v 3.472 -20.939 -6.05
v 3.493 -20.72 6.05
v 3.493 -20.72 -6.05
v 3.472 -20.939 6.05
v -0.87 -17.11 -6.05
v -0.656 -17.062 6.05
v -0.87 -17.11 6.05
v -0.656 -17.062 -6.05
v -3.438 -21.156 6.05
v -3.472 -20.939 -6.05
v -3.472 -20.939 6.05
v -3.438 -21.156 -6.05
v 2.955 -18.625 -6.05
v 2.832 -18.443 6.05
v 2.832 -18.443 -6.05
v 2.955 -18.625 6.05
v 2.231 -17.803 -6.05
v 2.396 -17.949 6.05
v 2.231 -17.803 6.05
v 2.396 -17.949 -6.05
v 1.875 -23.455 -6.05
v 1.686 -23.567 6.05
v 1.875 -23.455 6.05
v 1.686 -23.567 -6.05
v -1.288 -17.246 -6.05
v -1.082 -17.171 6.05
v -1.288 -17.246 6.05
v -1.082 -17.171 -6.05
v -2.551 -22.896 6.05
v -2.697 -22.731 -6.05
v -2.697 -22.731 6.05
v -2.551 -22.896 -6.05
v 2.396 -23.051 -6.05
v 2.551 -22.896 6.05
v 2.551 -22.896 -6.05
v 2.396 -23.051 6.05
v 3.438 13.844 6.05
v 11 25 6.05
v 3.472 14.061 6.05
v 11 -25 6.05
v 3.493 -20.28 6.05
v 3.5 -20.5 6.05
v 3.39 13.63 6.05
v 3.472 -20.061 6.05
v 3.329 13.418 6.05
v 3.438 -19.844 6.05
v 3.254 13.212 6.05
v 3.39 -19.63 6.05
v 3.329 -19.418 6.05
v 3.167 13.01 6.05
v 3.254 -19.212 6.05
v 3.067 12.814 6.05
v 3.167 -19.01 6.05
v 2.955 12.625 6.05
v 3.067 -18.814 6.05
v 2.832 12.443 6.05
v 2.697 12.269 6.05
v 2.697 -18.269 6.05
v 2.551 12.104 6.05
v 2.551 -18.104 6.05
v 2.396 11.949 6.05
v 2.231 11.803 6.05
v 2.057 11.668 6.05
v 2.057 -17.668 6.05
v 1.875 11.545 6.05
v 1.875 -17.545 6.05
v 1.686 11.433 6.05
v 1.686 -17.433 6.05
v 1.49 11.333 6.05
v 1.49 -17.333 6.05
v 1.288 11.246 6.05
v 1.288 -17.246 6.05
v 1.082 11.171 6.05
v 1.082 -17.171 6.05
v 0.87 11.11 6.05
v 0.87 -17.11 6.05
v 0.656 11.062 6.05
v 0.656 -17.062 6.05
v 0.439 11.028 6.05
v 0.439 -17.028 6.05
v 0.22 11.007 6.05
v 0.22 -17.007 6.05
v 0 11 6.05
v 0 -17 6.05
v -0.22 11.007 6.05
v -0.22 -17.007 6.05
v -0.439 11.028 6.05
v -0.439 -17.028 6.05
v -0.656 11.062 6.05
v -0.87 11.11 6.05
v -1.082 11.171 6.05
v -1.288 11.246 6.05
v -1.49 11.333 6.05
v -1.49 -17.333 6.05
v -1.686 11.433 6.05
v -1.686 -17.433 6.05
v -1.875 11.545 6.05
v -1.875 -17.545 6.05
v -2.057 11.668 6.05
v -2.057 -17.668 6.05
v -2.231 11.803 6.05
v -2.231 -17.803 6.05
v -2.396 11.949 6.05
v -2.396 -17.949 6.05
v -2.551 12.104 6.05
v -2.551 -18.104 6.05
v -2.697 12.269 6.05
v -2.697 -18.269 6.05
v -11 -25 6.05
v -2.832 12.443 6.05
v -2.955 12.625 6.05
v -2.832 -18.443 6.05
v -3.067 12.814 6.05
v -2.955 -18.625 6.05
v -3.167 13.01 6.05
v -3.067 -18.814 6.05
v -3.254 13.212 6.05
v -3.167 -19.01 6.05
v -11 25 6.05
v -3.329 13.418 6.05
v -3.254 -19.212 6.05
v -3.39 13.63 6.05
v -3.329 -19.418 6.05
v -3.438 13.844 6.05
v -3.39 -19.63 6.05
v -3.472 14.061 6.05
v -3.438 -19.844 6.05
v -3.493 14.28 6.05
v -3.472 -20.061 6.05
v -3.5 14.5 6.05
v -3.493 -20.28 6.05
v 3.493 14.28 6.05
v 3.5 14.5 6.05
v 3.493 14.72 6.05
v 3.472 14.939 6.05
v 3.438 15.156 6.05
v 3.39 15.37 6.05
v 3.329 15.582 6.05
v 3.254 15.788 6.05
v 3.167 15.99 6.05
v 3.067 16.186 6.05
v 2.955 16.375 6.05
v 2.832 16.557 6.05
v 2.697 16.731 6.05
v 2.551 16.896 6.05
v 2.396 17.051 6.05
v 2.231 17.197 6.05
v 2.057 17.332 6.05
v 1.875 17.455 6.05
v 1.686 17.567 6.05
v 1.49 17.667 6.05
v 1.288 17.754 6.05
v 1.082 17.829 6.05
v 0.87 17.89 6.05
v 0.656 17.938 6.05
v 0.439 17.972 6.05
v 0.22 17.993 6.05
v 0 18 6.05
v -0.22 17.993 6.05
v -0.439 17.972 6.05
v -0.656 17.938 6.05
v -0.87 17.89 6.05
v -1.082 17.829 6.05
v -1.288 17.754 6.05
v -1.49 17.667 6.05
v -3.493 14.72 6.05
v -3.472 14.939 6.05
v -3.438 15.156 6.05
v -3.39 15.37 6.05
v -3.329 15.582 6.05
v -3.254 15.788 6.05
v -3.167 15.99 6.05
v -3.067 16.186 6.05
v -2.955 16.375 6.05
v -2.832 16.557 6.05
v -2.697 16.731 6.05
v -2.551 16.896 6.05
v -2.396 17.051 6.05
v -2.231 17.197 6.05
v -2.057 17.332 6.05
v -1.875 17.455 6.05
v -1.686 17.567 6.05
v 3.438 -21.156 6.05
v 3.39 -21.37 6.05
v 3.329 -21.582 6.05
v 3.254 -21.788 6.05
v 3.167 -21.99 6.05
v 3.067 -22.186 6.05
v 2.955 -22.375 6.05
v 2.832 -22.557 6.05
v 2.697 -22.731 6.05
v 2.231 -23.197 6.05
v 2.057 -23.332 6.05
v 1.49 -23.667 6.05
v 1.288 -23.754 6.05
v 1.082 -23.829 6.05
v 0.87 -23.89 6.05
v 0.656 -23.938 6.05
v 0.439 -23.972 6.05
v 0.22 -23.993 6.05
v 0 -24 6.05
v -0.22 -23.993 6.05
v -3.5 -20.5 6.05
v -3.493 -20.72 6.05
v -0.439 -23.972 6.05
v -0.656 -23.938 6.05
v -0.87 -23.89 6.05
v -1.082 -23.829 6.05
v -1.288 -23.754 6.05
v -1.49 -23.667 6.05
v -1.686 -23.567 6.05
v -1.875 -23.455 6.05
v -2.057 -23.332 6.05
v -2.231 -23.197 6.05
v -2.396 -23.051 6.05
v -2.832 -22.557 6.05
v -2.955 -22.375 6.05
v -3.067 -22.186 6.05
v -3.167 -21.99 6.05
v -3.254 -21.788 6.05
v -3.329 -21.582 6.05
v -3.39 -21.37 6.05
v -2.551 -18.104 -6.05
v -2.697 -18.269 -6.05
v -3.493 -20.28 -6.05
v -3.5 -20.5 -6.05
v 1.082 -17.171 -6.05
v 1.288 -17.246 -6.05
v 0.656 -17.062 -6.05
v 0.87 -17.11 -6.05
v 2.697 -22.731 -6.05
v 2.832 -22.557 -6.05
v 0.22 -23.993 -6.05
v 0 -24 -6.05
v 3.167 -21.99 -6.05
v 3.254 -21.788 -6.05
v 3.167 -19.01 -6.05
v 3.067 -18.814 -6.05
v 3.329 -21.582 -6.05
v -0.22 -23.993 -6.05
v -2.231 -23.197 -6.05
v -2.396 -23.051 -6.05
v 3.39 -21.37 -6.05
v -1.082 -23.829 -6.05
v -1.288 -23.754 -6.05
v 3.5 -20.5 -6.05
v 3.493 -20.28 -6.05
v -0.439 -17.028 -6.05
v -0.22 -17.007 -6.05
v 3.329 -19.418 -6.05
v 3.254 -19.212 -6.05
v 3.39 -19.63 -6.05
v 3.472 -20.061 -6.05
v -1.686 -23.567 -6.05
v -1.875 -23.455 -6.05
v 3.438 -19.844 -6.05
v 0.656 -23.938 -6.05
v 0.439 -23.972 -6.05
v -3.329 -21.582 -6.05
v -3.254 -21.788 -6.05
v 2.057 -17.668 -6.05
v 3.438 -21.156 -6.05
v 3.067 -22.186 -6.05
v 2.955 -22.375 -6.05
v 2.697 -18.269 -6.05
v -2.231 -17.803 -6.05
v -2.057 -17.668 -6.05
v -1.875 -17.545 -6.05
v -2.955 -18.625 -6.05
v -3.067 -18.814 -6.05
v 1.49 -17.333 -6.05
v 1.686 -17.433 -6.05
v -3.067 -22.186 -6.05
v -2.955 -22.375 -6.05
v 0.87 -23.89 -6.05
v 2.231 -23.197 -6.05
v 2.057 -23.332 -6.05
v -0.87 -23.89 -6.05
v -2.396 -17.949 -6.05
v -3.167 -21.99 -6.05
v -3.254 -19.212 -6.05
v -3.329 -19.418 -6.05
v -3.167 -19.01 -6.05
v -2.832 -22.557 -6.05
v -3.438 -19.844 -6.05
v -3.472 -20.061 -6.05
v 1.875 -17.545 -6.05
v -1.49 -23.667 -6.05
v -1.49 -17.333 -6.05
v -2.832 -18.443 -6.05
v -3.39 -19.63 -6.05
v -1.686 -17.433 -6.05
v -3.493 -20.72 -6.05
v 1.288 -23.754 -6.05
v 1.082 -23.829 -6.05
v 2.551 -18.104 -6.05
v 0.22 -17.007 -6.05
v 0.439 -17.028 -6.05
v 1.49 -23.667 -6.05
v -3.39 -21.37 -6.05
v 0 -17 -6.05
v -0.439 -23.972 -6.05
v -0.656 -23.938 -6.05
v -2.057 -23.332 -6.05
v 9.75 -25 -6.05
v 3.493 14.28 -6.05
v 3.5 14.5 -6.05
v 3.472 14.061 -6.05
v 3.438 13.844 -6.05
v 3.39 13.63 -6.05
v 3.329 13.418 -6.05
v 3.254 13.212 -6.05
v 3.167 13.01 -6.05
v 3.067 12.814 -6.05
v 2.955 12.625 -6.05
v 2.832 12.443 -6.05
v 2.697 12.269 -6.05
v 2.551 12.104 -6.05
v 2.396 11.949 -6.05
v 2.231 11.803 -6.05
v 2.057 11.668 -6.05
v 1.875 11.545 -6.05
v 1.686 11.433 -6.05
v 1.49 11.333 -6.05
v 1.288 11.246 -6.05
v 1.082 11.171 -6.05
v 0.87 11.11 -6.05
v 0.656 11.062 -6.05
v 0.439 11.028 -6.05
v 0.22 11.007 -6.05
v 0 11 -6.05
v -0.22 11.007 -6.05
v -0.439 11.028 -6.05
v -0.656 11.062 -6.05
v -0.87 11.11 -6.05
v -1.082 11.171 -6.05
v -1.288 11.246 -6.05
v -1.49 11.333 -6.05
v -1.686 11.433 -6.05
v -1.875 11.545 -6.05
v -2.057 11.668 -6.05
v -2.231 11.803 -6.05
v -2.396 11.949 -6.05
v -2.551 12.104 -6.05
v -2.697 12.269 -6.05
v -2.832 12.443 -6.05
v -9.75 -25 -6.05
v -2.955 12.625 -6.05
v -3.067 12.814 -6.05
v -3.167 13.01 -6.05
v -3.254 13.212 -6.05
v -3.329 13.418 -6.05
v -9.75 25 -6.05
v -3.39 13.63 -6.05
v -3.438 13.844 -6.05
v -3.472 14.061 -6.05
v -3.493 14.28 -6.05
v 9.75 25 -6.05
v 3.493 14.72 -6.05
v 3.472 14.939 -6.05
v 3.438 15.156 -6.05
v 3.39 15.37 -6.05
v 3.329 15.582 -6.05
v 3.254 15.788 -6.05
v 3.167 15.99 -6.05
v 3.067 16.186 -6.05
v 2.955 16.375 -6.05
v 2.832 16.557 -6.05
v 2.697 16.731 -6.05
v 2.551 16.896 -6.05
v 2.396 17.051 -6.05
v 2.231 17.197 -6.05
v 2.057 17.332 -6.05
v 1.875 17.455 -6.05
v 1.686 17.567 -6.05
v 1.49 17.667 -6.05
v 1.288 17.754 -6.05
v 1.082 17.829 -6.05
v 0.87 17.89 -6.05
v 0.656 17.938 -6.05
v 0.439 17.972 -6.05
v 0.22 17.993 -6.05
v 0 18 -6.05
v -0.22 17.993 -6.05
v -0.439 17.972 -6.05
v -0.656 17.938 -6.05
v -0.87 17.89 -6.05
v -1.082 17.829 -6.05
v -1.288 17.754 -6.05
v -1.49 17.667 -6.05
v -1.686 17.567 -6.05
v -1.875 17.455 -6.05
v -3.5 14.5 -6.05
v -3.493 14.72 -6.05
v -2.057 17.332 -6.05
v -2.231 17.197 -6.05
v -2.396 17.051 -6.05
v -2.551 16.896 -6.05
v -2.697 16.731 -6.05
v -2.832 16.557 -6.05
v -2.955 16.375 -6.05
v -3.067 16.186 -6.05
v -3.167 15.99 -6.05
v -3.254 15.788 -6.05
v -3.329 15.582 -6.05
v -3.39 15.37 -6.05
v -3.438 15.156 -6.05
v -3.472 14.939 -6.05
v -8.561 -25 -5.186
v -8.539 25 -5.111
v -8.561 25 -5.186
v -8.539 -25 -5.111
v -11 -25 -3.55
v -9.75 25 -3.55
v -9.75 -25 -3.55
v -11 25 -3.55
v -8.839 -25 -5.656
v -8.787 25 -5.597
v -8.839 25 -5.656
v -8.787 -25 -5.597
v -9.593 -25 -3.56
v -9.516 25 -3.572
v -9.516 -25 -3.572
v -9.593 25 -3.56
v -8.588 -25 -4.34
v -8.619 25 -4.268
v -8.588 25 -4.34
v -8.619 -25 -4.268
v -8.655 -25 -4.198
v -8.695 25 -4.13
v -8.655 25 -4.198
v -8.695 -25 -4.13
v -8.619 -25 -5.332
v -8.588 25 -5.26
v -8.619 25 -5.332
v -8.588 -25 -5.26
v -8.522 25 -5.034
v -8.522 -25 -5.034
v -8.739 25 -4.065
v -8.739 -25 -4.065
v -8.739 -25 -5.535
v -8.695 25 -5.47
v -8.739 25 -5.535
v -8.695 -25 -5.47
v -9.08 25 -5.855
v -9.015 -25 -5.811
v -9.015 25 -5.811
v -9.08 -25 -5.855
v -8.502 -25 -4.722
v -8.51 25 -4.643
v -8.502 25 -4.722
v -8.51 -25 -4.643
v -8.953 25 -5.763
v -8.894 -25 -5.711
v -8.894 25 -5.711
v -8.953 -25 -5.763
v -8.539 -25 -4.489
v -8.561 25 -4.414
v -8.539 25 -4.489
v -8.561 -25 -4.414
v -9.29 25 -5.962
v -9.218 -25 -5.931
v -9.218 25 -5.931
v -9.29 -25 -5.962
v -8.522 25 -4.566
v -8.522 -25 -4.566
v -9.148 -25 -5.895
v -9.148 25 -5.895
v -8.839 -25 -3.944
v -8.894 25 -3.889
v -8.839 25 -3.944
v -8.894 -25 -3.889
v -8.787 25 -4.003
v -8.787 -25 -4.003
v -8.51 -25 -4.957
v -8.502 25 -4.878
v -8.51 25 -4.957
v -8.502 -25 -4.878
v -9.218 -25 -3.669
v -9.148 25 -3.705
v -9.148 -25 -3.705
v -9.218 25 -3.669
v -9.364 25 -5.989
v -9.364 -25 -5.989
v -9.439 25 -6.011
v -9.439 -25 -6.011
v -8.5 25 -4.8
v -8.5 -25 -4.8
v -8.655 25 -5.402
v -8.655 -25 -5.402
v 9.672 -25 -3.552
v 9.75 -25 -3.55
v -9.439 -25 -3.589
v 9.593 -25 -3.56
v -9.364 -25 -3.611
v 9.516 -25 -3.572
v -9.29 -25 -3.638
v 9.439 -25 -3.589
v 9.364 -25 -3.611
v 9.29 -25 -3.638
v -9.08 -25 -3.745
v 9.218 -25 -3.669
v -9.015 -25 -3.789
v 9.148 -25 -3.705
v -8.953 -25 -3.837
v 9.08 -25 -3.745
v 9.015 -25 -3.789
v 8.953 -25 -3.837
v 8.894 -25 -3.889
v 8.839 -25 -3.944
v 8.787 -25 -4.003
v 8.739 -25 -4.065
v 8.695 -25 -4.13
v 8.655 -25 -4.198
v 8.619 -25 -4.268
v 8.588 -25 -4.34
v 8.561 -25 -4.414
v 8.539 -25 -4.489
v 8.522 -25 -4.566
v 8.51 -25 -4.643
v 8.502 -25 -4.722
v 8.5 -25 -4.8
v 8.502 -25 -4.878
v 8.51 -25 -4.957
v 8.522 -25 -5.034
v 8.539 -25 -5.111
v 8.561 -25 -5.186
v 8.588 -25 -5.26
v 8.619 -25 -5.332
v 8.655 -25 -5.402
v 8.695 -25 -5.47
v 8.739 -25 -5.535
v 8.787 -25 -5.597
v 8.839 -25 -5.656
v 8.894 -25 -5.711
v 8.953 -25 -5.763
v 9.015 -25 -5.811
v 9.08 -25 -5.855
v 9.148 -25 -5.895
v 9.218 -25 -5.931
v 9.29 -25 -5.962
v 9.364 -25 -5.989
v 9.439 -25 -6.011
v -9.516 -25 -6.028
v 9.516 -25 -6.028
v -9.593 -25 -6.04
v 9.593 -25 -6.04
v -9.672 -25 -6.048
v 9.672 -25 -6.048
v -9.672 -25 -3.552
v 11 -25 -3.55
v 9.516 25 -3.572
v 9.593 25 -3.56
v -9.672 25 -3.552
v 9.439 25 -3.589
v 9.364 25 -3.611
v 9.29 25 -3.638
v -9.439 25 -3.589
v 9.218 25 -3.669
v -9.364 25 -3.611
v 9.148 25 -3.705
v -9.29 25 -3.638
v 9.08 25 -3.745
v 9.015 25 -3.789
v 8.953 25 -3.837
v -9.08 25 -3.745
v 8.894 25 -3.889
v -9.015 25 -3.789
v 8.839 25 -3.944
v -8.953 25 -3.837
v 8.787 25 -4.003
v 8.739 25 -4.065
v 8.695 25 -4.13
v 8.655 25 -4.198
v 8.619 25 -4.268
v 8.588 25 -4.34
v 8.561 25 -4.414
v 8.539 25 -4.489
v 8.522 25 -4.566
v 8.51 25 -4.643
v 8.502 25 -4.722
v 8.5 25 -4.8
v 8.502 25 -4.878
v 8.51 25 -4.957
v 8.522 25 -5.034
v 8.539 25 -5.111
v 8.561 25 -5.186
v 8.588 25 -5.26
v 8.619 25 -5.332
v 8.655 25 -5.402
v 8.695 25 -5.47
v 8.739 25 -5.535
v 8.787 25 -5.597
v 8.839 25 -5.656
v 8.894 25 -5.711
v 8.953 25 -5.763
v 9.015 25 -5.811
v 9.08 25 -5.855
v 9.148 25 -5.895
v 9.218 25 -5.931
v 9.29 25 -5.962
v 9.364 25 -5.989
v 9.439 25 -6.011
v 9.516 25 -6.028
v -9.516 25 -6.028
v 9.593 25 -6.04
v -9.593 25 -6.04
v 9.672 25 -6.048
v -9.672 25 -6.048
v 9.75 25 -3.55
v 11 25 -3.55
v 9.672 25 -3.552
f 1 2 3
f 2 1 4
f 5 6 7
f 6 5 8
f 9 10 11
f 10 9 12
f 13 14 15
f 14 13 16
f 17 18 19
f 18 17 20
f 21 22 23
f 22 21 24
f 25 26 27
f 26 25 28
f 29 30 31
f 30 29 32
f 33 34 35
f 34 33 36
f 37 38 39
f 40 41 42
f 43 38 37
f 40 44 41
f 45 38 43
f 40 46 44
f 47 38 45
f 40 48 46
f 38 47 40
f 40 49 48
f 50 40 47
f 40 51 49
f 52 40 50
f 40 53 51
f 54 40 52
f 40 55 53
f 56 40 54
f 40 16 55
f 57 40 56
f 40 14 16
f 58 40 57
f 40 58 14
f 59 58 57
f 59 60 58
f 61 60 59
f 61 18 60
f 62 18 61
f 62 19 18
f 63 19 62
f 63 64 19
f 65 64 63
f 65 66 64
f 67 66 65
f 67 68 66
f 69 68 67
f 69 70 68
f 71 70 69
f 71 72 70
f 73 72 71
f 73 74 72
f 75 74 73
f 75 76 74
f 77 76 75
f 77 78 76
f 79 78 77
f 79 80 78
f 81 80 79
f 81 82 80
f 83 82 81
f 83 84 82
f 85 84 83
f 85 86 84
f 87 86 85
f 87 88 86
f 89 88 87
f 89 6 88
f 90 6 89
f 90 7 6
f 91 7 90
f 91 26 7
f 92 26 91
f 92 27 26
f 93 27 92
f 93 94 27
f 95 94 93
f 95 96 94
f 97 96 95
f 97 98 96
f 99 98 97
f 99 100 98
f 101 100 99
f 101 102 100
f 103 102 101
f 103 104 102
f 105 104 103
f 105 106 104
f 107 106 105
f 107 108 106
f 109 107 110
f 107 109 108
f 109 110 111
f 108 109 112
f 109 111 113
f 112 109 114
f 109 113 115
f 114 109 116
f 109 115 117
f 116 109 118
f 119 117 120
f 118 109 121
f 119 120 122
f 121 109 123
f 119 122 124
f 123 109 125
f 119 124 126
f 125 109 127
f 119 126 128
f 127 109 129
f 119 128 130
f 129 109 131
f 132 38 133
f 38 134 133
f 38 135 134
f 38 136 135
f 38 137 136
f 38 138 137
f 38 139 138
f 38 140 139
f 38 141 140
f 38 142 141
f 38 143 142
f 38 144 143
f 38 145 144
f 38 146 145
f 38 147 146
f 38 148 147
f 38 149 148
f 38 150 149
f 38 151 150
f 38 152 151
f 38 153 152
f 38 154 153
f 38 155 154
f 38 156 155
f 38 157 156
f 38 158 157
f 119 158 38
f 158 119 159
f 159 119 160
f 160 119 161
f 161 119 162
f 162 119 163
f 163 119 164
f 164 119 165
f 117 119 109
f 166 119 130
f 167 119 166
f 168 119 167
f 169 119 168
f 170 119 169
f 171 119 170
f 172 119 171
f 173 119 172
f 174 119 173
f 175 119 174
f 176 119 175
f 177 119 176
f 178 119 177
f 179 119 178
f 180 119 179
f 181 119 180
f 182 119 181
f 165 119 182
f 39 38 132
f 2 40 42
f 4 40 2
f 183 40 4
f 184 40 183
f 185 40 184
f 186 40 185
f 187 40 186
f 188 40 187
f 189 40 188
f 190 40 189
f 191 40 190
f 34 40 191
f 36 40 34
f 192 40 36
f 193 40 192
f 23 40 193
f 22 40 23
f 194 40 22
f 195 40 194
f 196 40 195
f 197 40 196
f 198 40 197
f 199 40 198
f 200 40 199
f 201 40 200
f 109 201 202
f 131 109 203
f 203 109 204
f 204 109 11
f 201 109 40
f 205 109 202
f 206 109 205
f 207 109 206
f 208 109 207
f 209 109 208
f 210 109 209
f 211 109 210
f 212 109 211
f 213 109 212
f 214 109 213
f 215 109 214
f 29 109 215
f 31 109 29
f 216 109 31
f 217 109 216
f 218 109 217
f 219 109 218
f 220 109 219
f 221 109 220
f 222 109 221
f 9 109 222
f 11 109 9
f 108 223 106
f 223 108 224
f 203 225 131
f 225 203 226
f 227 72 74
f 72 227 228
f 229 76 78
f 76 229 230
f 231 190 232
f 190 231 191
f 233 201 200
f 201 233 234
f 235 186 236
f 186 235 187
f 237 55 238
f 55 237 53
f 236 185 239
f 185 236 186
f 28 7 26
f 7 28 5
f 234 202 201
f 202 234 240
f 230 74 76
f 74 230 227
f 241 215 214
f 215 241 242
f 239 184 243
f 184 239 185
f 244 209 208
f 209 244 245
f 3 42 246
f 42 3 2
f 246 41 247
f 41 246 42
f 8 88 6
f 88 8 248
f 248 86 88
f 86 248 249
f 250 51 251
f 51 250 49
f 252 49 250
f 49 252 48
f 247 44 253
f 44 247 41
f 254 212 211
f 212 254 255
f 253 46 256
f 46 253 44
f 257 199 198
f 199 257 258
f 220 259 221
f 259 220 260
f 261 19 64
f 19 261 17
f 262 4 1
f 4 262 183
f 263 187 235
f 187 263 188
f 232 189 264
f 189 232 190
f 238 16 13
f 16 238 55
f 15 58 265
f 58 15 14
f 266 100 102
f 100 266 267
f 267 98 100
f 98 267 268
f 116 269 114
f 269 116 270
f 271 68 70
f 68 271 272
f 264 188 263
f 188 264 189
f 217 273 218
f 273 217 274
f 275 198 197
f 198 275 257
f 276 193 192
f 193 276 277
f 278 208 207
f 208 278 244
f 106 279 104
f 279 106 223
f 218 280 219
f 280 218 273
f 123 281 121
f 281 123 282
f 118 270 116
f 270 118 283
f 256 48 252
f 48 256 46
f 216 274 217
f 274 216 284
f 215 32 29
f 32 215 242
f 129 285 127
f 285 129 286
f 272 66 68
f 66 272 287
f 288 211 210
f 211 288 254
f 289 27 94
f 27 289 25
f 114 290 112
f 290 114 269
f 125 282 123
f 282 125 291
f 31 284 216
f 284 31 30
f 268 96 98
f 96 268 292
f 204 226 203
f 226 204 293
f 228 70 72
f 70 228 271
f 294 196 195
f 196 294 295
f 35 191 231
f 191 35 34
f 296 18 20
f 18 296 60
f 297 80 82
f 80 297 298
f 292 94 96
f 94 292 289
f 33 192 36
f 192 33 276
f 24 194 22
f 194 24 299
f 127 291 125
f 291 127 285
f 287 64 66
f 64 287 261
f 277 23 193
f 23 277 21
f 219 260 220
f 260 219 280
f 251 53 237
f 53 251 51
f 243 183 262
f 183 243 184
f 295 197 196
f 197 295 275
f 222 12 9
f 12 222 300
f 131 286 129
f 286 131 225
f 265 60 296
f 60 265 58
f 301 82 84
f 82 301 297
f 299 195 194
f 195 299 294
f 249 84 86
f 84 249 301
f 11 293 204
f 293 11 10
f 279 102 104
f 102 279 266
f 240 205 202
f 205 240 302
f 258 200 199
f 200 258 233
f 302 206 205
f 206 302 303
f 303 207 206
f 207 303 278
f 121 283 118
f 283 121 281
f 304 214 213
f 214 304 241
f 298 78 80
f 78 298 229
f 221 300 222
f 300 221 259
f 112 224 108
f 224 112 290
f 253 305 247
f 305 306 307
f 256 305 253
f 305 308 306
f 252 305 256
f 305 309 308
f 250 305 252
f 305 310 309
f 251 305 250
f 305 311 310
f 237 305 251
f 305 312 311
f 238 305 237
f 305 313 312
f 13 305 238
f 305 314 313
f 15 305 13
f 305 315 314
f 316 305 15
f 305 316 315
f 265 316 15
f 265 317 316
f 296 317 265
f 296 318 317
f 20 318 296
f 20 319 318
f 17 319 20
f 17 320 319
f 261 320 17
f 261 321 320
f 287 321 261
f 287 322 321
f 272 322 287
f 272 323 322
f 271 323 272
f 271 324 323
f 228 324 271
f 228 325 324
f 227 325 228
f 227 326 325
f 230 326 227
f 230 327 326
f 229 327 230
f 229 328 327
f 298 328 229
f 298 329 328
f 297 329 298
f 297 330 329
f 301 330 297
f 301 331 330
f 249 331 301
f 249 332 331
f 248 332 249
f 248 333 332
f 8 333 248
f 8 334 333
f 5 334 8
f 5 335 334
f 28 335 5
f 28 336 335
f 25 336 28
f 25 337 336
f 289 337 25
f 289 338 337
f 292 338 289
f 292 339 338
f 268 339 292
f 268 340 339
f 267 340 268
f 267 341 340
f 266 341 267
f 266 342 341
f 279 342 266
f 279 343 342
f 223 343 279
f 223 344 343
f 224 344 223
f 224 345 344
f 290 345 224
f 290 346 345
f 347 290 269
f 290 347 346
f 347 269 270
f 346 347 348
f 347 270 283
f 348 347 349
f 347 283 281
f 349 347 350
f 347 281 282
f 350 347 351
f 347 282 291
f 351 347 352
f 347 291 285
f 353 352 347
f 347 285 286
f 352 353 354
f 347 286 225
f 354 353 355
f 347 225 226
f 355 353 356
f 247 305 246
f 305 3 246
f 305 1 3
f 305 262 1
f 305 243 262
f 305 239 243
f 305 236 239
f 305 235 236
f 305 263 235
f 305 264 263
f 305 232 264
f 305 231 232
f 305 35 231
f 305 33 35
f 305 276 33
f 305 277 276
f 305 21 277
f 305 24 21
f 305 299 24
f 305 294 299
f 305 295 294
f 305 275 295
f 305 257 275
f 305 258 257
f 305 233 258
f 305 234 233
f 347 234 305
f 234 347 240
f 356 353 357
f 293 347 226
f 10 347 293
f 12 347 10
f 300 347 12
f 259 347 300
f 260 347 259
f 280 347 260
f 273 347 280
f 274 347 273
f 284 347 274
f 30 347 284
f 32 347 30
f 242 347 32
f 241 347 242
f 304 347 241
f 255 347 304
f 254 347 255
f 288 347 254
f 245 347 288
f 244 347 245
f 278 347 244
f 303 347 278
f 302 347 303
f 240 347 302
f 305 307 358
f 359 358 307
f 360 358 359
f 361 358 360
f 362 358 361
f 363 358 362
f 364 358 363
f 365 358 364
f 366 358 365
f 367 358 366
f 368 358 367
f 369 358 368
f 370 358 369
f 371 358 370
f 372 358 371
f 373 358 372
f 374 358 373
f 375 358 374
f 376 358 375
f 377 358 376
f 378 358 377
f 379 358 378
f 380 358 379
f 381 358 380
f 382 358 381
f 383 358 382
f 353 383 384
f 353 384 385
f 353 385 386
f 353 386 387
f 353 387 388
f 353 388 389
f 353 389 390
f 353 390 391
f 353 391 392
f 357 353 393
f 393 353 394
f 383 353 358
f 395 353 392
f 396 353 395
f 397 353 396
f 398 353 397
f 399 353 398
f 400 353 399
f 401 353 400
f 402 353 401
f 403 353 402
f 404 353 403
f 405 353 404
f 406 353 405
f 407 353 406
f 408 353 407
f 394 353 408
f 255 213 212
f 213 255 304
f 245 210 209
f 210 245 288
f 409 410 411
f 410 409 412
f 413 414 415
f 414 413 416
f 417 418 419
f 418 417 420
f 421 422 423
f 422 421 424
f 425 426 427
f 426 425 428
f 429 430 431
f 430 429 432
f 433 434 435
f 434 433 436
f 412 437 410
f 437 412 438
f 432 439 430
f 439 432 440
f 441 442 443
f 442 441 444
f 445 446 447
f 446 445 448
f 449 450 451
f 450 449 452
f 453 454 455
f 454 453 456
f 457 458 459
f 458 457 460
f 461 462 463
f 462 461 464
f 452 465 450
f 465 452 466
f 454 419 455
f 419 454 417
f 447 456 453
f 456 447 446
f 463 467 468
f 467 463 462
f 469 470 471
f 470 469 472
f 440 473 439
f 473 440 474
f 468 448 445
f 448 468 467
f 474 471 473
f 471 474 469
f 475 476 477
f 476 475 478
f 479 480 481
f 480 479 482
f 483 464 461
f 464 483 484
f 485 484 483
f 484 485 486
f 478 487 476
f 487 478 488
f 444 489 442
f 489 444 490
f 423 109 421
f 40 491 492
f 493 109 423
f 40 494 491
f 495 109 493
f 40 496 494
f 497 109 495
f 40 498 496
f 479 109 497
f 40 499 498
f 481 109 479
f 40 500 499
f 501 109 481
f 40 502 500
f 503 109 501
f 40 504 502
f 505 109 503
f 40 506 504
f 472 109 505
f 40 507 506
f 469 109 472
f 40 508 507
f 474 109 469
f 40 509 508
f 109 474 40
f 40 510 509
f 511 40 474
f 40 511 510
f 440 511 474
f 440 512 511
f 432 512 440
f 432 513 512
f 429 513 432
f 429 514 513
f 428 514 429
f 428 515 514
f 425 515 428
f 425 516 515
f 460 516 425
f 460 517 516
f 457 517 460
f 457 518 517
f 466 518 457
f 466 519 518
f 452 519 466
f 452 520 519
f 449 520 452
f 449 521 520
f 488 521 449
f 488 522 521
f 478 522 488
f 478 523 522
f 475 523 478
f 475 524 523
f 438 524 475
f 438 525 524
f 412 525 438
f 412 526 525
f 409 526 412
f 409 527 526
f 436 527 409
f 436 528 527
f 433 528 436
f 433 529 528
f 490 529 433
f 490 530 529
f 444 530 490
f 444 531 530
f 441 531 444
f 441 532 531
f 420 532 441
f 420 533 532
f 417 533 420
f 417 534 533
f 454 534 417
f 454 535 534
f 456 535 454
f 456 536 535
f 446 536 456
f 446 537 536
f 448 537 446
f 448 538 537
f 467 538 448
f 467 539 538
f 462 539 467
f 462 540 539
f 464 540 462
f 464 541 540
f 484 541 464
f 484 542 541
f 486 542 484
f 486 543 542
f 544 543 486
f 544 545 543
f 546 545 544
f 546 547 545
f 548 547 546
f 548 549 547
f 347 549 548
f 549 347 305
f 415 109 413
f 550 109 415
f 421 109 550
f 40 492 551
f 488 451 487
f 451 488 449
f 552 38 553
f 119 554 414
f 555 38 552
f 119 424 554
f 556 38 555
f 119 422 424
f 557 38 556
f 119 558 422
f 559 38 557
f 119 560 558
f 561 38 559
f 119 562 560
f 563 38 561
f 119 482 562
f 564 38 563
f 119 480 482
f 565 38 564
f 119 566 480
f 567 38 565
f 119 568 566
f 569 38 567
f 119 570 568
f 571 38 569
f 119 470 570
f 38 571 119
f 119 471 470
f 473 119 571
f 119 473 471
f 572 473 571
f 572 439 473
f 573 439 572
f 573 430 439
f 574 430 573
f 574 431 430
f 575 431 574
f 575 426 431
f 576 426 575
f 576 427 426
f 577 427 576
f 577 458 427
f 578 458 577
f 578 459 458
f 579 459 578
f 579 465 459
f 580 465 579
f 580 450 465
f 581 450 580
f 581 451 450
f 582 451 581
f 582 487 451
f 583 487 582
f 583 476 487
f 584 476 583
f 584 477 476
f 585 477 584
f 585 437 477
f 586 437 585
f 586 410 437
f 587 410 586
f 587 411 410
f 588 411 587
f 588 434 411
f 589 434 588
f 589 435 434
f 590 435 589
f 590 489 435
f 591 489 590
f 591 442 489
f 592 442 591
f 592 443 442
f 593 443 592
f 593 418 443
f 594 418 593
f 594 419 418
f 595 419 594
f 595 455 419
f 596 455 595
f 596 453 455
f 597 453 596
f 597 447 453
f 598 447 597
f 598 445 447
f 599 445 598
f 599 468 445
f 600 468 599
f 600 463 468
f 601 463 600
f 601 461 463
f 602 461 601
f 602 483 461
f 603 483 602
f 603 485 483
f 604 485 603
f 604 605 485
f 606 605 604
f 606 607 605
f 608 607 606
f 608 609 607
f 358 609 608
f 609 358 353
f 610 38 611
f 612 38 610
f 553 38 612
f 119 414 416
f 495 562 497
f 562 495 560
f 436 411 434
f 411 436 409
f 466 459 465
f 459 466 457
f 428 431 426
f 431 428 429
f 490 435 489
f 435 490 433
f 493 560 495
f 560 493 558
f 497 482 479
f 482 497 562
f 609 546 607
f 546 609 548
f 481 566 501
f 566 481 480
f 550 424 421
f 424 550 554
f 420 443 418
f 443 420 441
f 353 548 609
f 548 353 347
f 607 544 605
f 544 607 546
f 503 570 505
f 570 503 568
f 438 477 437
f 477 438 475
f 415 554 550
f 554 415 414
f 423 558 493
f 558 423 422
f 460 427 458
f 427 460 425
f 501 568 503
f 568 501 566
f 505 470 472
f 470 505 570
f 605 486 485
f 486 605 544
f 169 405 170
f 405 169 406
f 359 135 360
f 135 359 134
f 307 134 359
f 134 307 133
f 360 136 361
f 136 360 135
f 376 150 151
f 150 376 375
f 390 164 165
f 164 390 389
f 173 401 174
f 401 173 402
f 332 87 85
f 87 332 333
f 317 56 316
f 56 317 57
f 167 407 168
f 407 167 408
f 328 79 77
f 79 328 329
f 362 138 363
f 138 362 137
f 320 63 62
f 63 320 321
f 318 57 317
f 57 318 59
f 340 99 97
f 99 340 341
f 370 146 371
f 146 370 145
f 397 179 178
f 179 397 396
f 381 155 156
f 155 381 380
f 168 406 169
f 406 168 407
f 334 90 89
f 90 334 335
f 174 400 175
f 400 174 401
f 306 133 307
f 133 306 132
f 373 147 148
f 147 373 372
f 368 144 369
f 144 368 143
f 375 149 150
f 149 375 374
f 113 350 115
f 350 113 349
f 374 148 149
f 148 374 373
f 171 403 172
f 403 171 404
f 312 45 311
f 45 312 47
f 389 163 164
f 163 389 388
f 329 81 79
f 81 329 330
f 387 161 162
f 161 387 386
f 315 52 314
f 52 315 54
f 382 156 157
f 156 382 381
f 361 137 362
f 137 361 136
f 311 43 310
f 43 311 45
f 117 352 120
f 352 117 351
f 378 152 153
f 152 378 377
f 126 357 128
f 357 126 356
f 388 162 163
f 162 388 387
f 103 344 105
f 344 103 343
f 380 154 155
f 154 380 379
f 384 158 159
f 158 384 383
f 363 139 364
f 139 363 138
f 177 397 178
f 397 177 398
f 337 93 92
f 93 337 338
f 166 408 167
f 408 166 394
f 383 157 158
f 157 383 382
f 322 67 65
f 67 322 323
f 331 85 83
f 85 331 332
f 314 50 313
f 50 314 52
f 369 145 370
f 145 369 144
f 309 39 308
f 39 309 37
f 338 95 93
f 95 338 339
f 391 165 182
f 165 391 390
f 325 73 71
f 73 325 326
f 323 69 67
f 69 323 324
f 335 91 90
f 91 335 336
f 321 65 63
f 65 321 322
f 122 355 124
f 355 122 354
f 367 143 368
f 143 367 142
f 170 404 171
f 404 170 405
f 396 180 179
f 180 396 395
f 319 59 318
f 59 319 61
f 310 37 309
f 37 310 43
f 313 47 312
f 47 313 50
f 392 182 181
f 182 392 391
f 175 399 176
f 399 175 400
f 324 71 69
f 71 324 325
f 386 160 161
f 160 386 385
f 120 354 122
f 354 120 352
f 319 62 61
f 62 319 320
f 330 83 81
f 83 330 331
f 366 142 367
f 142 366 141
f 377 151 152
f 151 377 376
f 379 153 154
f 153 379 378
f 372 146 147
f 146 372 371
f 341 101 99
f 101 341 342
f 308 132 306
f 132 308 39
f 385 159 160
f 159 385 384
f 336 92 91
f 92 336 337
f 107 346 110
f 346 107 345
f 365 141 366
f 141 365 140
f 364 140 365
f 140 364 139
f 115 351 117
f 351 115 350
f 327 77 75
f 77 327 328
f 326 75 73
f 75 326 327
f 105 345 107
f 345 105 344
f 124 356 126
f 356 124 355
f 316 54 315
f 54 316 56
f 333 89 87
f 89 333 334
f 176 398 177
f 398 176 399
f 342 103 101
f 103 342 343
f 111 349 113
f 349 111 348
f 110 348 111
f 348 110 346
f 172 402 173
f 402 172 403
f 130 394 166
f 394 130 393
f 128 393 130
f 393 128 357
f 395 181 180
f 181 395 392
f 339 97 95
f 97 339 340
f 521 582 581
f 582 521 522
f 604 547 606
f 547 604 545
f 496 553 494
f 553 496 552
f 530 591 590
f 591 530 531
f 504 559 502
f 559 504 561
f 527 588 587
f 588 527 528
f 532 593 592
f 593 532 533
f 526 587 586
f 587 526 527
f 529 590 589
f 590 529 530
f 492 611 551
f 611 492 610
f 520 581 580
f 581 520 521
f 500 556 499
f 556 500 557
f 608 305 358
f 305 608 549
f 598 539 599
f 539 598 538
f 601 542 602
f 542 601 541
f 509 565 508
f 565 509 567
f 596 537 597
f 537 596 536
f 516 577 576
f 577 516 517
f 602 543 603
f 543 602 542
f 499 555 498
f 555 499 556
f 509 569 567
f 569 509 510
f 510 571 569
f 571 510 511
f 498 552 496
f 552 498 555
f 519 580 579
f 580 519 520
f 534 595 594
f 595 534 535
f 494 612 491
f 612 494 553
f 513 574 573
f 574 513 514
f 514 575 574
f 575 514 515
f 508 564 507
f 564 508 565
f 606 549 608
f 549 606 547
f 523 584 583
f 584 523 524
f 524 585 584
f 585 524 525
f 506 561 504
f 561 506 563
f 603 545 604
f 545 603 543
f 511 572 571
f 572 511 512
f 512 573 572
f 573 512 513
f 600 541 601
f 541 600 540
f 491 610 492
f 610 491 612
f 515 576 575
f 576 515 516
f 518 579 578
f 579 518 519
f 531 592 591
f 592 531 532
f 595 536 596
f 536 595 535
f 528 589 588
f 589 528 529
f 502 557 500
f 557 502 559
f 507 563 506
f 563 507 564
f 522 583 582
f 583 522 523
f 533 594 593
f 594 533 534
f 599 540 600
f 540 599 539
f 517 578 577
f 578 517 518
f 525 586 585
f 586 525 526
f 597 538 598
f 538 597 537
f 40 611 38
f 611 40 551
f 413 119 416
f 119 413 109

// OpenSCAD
WIDTH = 22;
LENGTH = 50;
HEIGHT = 12.1;

MOUNTING_HOLE_DIA = 7;
MOUNTING_HOLE_SPACING = 35;
MOUNTING_HOLE_OFFSET = 12 - (LENGTH - MOUNTING_HOLE_SPACING);

STRAINER_ARM_DIA = 2.5;

$fn = 100;

difference() {
    cube(size = [WIDTH, LENGTH, HEIGHT], center = true);

    for(i = [-1, 1]) {
        translate([0, i * MOUNTING_HOLE_SPACING/2 + MOUNTING_HOLE_OFFSET, 0])
        cylinder(d = MOUNTING_HOLE_DIA, h = HEIGHT, center = true);

        hull() {
            translate([i * (WIDTH - STRAINER_ARM_DIA)/2, 0, -(HEIGHT - STRAINER_ARM_DIA)/2])
            rotate([90, 0, 0])
            cylinder(d = STRAINER_ARM_DIA, h = LENGTH, center = true);

            translate([i * WIDTH/2, 0, -(HEIGHT - STRAINER_ARM_DIA)/2])
            rotate([90, 0, 0])
            cylinder(d = STRAINER_ARM_DIA, h = LENGTH, center = true);
        }
    }
}
